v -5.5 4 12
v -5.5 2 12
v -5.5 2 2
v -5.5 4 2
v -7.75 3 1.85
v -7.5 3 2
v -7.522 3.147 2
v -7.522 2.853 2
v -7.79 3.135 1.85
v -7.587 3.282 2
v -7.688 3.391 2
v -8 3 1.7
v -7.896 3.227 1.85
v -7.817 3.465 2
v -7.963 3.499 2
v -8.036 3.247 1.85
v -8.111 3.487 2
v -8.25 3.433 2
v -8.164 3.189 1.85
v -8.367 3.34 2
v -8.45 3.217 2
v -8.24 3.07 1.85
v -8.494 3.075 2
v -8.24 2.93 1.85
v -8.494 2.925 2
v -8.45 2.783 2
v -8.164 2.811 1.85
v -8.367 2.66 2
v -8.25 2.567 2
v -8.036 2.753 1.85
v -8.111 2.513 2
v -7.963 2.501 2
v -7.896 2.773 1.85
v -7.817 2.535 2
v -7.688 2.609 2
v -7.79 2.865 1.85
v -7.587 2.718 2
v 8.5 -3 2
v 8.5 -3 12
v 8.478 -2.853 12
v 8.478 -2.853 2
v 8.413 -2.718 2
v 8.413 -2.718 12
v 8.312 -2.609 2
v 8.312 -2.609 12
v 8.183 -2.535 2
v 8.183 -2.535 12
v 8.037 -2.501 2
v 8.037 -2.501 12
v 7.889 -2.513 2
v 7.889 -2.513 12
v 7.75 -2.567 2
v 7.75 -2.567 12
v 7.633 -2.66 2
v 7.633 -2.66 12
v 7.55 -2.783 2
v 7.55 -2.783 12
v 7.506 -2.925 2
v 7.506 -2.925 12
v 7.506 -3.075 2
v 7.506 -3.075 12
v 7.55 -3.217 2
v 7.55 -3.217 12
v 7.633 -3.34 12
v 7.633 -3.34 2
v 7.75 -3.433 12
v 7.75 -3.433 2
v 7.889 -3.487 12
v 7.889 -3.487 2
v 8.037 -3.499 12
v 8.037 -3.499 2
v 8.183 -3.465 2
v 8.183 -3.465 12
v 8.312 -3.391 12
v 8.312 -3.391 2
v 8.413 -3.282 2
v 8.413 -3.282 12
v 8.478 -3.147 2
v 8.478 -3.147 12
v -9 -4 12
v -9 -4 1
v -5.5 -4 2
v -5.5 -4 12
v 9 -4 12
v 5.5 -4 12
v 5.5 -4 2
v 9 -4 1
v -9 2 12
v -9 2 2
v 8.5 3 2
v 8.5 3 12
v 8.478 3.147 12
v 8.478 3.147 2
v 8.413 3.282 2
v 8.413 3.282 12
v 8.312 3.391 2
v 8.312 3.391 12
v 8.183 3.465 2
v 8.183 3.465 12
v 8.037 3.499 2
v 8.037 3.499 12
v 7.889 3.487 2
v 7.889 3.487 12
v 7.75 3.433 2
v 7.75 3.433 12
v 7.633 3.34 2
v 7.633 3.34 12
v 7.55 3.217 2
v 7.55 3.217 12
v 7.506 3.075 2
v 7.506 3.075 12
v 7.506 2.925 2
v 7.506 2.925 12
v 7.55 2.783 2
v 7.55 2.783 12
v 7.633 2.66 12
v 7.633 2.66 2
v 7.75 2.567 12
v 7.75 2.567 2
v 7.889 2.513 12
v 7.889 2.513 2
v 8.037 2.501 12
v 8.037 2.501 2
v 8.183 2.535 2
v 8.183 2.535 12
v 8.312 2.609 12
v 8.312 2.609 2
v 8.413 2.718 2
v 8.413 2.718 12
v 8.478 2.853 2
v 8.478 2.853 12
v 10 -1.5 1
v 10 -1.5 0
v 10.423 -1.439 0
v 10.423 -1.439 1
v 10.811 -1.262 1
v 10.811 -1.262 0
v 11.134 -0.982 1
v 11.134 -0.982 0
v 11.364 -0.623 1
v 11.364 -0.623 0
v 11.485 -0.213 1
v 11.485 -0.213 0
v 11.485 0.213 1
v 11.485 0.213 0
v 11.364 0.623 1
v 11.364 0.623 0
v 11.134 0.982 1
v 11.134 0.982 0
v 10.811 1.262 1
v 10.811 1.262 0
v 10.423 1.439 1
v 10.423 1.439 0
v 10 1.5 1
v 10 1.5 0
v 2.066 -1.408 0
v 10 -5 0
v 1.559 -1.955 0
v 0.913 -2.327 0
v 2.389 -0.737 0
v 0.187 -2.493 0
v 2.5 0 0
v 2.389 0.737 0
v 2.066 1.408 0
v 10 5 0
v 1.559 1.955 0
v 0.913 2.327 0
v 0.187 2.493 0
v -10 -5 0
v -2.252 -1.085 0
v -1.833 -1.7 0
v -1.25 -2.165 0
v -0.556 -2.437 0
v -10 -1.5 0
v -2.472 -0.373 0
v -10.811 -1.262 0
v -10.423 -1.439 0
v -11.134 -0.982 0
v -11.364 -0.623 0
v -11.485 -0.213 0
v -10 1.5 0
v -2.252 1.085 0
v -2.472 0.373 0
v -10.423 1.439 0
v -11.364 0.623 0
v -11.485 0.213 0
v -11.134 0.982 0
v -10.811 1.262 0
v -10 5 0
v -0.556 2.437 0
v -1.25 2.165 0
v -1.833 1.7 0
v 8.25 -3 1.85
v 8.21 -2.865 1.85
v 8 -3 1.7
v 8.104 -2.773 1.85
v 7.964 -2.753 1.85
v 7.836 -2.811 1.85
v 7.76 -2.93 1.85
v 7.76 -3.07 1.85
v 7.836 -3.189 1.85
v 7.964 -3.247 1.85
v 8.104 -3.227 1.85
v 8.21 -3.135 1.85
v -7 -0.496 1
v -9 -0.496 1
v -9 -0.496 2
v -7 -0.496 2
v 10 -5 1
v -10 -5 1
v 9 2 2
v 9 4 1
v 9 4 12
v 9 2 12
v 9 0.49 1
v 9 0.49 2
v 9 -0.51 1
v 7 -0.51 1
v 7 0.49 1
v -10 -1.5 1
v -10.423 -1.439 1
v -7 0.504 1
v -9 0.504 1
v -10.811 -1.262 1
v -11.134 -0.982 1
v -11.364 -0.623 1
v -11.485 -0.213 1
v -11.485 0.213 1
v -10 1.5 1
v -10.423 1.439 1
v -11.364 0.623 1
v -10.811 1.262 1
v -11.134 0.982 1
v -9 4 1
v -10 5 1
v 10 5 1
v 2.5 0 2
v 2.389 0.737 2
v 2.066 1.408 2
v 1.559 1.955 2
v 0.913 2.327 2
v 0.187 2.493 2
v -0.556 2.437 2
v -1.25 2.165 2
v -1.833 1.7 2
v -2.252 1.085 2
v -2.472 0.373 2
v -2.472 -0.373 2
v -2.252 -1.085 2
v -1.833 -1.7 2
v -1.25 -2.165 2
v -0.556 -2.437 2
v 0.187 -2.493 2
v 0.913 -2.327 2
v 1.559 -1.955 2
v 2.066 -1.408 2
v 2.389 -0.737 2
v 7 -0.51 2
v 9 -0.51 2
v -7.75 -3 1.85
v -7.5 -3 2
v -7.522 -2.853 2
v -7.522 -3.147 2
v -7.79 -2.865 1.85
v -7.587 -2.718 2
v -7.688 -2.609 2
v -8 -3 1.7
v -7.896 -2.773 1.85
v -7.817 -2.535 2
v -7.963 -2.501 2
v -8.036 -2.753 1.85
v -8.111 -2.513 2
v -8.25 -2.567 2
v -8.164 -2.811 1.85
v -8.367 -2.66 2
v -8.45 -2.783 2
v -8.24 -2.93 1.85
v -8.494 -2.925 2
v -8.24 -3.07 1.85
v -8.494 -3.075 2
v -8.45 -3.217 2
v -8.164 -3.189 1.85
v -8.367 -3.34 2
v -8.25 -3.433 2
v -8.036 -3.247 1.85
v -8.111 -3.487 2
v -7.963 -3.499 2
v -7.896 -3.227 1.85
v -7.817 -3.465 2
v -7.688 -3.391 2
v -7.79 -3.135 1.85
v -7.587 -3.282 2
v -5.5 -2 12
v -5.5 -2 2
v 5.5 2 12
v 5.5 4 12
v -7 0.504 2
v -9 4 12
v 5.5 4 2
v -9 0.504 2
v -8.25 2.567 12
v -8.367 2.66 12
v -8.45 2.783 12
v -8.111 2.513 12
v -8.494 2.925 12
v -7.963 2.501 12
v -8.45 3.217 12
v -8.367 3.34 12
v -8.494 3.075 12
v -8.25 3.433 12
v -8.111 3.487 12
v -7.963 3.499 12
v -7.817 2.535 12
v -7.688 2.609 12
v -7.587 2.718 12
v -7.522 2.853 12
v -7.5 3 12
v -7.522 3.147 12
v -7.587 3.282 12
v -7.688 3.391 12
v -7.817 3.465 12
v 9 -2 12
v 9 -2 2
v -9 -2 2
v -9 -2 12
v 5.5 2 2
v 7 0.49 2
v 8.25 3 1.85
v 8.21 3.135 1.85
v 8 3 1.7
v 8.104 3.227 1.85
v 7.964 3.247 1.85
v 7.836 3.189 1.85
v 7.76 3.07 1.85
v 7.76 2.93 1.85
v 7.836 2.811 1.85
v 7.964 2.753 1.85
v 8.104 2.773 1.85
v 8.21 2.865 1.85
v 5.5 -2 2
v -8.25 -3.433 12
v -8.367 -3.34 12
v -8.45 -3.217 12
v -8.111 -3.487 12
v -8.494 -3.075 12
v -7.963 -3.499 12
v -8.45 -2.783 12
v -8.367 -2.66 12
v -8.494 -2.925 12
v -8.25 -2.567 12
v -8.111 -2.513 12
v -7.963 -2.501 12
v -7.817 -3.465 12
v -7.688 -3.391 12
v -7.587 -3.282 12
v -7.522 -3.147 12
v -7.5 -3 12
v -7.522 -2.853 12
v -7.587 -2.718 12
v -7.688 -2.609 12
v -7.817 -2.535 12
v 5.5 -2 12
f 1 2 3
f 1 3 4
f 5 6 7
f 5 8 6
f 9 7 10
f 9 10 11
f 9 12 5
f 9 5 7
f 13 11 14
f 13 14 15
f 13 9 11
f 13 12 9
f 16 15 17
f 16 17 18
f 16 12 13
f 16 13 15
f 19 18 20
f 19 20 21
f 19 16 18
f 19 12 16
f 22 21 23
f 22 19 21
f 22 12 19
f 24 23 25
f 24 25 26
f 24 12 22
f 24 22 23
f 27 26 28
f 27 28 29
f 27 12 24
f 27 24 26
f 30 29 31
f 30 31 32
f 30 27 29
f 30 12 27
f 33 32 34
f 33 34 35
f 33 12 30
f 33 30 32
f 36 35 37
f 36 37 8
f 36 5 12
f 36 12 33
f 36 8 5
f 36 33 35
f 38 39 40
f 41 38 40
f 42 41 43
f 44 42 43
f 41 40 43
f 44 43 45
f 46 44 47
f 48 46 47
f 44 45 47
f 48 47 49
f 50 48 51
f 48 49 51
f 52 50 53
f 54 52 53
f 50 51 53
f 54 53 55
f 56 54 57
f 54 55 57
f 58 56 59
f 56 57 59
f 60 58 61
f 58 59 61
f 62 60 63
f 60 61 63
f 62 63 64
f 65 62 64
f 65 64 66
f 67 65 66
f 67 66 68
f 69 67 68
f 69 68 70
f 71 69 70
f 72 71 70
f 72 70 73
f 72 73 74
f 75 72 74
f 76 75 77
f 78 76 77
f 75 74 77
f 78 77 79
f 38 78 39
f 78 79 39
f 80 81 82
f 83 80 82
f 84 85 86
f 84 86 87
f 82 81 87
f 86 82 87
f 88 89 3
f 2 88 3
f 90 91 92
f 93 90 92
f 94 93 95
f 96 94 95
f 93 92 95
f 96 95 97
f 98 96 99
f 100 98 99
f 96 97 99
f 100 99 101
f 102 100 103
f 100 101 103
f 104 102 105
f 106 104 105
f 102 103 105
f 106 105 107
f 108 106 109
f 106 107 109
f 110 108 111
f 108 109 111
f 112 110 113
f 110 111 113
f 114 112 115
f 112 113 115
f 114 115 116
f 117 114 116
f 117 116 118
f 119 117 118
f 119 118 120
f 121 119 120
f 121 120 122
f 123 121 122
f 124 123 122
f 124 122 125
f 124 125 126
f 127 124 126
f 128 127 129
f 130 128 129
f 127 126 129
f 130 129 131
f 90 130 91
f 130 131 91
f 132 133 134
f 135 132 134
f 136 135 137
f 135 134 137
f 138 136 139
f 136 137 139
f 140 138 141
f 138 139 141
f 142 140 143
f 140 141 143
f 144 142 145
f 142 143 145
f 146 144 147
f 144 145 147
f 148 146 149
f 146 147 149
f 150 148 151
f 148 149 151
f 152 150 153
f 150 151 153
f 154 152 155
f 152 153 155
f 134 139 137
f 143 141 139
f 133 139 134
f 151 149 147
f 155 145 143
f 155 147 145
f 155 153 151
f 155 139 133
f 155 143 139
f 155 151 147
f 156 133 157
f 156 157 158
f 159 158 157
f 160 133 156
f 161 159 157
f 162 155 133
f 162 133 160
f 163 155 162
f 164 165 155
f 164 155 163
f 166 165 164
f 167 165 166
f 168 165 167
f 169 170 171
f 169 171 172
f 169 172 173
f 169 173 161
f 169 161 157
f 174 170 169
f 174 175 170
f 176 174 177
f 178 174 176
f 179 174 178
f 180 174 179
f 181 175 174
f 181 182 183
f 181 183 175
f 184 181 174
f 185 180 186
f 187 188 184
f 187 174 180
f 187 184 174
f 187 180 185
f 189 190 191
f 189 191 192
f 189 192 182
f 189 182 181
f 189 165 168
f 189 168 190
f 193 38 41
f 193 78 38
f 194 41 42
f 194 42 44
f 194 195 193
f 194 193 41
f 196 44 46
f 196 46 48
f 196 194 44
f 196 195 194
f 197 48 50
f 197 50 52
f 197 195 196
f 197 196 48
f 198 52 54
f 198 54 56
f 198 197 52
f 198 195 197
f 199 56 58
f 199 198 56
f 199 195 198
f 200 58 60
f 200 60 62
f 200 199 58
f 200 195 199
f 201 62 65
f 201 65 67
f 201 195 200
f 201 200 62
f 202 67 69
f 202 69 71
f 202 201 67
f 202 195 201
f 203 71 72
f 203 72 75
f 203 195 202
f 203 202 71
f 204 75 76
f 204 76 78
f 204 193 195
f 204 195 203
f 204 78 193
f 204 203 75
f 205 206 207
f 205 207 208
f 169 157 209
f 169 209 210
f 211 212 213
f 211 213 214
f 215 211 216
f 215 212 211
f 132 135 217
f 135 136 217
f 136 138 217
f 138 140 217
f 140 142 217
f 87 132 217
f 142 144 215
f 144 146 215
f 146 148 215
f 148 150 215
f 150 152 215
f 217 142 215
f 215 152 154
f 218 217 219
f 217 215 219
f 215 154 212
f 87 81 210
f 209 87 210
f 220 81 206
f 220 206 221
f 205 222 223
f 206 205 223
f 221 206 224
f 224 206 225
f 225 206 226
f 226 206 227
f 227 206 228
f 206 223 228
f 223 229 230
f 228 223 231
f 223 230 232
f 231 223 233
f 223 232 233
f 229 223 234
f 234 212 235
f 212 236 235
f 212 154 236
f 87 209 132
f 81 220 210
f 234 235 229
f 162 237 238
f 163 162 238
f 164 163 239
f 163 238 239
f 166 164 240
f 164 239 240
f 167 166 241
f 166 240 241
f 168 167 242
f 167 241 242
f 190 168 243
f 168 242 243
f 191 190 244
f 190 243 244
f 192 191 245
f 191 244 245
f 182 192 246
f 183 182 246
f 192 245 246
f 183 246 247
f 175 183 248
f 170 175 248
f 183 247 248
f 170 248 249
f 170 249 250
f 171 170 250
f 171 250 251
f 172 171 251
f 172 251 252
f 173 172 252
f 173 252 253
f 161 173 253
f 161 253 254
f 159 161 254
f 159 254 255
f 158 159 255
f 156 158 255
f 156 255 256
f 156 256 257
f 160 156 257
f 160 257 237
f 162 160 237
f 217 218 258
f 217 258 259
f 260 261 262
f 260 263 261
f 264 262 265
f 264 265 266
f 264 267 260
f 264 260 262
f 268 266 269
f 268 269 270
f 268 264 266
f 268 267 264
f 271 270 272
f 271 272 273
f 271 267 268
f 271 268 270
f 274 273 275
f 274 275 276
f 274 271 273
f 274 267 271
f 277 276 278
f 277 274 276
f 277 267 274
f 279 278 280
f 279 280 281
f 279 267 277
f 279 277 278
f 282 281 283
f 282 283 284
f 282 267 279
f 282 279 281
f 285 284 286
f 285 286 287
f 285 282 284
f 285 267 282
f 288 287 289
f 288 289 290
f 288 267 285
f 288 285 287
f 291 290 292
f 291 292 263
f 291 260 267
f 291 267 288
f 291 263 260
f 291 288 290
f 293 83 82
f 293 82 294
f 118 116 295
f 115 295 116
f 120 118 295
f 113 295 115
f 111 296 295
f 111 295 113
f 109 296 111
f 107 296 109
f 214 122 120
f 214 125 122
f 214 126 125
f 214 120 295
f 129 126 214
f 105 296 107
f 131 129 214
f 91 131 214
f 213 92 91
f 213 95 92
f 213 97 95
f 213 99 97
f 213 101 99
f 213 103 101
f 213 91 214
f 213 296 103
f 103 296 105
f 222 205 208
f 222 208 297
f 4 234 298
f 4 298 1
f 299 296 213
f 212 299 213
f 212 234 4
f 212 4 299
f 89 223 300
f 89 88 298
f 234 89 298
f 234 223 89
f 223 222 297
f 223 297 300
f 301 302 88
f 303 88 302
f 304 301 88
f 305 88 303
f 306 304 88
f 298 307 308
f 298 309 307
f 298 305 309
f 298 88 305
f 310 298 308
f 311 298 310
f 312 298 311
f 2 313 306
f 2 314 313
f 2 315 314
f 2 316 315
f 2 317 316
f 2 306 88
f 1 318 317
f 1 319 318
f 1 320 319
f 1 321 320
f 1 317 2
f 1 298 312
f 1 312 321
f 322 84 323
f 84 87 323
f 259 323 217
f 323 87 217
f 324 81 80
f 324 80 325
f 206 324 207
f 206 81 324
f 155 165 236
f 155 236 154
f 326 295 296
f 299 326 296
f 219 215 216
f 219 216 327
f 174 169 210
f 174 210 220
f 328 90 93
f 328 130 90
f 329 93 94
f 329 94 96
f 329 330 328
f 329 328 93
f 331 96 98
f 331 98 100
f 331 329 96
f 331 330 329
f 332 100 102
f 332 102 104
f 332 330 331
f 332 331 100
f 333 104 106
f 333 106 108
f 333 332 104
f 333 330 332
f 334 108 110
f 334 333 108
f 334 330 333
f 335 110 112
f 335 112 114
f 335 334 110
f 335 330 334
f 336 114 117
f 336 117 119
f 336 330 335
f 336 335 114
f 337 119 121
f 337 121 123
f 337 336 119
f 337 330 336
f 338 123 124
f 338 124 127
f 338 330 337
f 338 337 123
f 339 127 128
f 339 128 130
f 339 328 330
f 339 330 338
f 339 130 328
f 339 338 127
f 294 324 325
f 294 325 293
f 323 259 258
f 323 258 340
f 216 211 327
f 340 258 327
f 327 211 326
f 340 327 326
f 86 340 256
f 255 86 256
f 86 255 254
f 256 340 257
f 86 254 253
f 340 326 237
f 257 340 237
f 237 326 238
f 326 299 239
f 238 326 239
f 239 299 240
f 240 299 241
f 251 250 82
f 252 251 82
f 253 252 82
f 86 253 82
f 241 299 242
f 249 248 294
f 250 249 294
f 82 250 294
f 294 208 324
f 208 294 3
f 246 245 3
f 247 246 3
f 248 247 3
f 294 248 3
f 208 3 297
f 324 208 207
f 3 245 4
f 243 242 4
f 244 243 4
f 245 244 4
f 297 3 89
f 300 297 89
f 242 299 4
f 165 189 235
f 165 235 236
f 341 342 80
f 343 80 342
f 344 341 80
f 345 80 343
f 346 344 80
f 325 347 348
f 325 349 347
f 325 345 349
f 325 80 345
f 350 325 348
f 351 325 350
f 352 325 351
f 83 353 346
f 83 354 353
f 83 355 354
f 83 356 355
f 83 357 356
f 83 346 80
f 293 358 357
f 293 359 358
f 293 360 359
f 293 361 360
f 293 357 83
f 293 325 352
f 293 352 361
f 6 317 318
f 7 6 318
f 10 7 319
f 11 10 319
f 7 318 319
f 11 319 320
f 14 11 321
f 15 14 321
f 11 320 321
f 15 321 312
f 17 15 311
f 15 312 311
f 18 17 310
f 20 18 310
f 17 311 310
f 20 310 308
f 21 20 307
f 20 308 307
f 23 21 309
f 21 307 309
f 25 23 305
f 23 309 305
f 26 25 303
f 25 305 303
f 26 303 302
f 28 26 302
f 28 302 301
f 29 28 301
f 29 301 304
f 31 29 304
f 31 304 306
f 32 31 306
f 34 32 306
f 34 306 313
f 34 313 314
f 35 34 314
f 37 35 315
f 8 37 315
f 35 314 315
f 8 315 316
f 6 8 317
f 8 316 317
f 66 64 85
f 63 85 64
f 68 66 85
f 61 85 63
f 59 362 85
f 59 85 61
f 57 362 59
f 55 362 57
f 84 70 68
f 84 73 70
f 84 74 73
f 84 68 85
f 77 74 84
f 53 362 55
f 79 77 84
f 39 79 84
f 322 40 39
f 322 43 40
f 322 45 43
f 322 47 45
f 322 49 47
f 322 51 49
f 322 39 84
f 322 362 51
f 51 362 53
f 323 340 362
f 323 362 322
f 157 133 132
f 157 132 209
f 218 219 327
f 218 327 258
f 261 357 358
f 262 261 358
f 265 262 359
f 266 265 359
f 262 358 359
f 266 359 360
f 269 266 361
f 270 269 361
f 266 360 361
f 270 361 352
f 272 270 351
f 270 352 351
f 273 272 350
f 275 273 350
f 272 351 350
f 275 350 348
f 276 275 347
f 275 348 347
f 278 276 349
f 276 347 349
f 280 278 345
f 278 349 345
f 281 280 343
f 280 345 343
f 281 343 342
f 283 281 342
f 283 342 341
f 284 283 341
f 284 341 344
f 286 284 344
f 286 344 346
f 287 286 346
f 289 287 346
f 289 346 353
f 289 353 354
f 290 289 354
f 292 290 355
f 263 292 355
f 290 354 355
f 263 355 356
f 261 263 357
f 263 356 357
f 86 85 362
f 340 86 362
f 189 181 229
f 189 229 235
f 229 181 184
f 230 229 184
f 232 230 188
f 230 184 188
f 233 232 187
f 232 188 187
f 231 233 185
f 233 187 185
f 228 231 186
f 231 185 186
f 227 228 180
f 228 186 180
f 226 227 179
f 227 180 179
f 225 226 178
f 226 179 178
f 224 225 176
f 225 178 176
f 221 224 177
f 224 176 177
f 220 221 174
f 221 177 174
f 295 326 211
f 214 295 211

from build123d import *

# Parameters (mm, degrees)
PAD_DEPTH    = 1
PAD001_DEPTH = 1
SKETCH002_W  = 3.5
SKETCH002_H  = 2
PAD002_DEPTH = 10
SKETCH003_R  = 2.5
POCKET_DEPTH = 2.001
SKETCH004_R  = 0.5
HOLE_DEPTH   = 10
HOLE_TIPS_R  = 0.5


with BuildPart() as part:
    # Sketch → Pad (new body)
    with BuildSketch(Plane.XY):
        with BuildLine():
            Line((-10, 5), (10, 5))
            Line((10, 5), (10, 1.5))
            ThreePointArc((10, -1.5), (11.5, 0), (10, 1.5))
            Line((10, -1.5), (10, -5))
            Line((10, -5), (-10, -5))
            Line((-10, -5), (-10, -1.5))
            ThreePointArc((-10, 1.5), (-11.5, 0), (-10, -1.5))
            Line((-10, 1.5), (-10, 5))
        make_face()
    extrude(amount=PAD_DEPTH)

    # Sketch001 (on Face10 of Pad) → Pad001 (join)
    with BuildSketch(Plane.XY.offset(1)):
        Polygon((-9, 4), (9, 4), (9, 0.489518), (7, 0.489518), (7, -0.510482), (9, -0.510482), (9, -4), (-9, -4), (-9, -0.49649), (-7, -0.49649), (-7, 0.50351), (-9, 0.50351), align=None)
    extrude(amount=PAD001_DEPTH)

    # Sketch002 (on Face23 of Pad001) → Pad002 (join)
    with BuildSketch(Plane.XY.offset(2)):
        with Locations((7.25, -3)):
            Rectangle(SKETCH002_W, SKETCH002_H)
        with Locations((7.25, 3)):
            Rectangle(SKETCH002_W, SKETCH002_H)
        with Locations((-7.25, 3)):
            Rectangle(SKETCH002_W, SKETCH002_H)
        with Locations((-7.25, -3)):
            Rectangle(SKETCH002_W, SKETCH002_H)
    extrude(amount=PAD002_DEPTH)

    # Sketch003 (on Face23 of Pad002) → Pocket (cut, through all)
    with BuildSketch(Plane.XY.offset(2)):
        Circle(SKETCH003_R)
    extrude(amount=-POCKET_DEPTH, mode=Mode.SUBTRACT)

    # Sketch004 (on Face42 of Pocket) → Hole (cut)
    with BuildSketch(Plane.XY.offset(12)):
        with Locations((8, -3)):
            Circle(SKETCH004_R)
        with Locations((-8, 3)):
            Circle(SKETCH004_R)
        with Locations((-8, -3)):
            Circle(SKETCH004_R)
        with Locations((8, 3)):
            Circle(SKETCH004_R)
    extrude(amount=-HOLE_DEPTH, mode=Mode.SUBTRACT)

    # Hole tips → Hole tip 1 section 0
    with BuildSketch(Plane.XY.offset(2), mode=Mode.PRIVATE) as hole_tip_1_s0:
        with Locations((8, -3)):
            Circle(HOLE_TIPS_R)
    loft([hole_tip_1_s0.sketch, Vertex(8, -3, 1.69957)], mode=Mode.SUBTRACT)

    # Hole tips → Hole tip 2 section 0
    with BuildSketch(Plane.XY.offset(2), mode=Mode.PRIVATE) as hole_tip_2_s0:
        with Locations((-8, 3)):
            Circle(HOLE_TIPS_R)
    loft([hole_tip_2_s0.sketch, Vertex(-8, 3, 1.69957)], mode=Mode.SUBTRACT)

    # Hole tips → Hole tip 3 section 0
    with BuildSketch(Plane.XY.offset(2), mode=Mode.PRIVATE) as hole_tip_3_s0:
        with Locations((-8, -3)):
            Circle(HOLE_TIPS_R)
    loft([hole_tip_3_s0.sketch, Vertex(-8, -3, 1.69957)], mode=Mode.SUBTRACT)

    # Hole tips → Hole tip 4 section 0
    with BuildSketch(Plane.XY.offset(2), mode=Mode.PRIVATE) as hole_tip_4_s0:
        with Locations((8, 3)):
            Circle(HOLE_TIPS_R)
    loft([hole_tip_4_s0.sketch, Vertex(8, 3, 1.69957)], mode=Mode.SUBTRACT)


solid = part.part
